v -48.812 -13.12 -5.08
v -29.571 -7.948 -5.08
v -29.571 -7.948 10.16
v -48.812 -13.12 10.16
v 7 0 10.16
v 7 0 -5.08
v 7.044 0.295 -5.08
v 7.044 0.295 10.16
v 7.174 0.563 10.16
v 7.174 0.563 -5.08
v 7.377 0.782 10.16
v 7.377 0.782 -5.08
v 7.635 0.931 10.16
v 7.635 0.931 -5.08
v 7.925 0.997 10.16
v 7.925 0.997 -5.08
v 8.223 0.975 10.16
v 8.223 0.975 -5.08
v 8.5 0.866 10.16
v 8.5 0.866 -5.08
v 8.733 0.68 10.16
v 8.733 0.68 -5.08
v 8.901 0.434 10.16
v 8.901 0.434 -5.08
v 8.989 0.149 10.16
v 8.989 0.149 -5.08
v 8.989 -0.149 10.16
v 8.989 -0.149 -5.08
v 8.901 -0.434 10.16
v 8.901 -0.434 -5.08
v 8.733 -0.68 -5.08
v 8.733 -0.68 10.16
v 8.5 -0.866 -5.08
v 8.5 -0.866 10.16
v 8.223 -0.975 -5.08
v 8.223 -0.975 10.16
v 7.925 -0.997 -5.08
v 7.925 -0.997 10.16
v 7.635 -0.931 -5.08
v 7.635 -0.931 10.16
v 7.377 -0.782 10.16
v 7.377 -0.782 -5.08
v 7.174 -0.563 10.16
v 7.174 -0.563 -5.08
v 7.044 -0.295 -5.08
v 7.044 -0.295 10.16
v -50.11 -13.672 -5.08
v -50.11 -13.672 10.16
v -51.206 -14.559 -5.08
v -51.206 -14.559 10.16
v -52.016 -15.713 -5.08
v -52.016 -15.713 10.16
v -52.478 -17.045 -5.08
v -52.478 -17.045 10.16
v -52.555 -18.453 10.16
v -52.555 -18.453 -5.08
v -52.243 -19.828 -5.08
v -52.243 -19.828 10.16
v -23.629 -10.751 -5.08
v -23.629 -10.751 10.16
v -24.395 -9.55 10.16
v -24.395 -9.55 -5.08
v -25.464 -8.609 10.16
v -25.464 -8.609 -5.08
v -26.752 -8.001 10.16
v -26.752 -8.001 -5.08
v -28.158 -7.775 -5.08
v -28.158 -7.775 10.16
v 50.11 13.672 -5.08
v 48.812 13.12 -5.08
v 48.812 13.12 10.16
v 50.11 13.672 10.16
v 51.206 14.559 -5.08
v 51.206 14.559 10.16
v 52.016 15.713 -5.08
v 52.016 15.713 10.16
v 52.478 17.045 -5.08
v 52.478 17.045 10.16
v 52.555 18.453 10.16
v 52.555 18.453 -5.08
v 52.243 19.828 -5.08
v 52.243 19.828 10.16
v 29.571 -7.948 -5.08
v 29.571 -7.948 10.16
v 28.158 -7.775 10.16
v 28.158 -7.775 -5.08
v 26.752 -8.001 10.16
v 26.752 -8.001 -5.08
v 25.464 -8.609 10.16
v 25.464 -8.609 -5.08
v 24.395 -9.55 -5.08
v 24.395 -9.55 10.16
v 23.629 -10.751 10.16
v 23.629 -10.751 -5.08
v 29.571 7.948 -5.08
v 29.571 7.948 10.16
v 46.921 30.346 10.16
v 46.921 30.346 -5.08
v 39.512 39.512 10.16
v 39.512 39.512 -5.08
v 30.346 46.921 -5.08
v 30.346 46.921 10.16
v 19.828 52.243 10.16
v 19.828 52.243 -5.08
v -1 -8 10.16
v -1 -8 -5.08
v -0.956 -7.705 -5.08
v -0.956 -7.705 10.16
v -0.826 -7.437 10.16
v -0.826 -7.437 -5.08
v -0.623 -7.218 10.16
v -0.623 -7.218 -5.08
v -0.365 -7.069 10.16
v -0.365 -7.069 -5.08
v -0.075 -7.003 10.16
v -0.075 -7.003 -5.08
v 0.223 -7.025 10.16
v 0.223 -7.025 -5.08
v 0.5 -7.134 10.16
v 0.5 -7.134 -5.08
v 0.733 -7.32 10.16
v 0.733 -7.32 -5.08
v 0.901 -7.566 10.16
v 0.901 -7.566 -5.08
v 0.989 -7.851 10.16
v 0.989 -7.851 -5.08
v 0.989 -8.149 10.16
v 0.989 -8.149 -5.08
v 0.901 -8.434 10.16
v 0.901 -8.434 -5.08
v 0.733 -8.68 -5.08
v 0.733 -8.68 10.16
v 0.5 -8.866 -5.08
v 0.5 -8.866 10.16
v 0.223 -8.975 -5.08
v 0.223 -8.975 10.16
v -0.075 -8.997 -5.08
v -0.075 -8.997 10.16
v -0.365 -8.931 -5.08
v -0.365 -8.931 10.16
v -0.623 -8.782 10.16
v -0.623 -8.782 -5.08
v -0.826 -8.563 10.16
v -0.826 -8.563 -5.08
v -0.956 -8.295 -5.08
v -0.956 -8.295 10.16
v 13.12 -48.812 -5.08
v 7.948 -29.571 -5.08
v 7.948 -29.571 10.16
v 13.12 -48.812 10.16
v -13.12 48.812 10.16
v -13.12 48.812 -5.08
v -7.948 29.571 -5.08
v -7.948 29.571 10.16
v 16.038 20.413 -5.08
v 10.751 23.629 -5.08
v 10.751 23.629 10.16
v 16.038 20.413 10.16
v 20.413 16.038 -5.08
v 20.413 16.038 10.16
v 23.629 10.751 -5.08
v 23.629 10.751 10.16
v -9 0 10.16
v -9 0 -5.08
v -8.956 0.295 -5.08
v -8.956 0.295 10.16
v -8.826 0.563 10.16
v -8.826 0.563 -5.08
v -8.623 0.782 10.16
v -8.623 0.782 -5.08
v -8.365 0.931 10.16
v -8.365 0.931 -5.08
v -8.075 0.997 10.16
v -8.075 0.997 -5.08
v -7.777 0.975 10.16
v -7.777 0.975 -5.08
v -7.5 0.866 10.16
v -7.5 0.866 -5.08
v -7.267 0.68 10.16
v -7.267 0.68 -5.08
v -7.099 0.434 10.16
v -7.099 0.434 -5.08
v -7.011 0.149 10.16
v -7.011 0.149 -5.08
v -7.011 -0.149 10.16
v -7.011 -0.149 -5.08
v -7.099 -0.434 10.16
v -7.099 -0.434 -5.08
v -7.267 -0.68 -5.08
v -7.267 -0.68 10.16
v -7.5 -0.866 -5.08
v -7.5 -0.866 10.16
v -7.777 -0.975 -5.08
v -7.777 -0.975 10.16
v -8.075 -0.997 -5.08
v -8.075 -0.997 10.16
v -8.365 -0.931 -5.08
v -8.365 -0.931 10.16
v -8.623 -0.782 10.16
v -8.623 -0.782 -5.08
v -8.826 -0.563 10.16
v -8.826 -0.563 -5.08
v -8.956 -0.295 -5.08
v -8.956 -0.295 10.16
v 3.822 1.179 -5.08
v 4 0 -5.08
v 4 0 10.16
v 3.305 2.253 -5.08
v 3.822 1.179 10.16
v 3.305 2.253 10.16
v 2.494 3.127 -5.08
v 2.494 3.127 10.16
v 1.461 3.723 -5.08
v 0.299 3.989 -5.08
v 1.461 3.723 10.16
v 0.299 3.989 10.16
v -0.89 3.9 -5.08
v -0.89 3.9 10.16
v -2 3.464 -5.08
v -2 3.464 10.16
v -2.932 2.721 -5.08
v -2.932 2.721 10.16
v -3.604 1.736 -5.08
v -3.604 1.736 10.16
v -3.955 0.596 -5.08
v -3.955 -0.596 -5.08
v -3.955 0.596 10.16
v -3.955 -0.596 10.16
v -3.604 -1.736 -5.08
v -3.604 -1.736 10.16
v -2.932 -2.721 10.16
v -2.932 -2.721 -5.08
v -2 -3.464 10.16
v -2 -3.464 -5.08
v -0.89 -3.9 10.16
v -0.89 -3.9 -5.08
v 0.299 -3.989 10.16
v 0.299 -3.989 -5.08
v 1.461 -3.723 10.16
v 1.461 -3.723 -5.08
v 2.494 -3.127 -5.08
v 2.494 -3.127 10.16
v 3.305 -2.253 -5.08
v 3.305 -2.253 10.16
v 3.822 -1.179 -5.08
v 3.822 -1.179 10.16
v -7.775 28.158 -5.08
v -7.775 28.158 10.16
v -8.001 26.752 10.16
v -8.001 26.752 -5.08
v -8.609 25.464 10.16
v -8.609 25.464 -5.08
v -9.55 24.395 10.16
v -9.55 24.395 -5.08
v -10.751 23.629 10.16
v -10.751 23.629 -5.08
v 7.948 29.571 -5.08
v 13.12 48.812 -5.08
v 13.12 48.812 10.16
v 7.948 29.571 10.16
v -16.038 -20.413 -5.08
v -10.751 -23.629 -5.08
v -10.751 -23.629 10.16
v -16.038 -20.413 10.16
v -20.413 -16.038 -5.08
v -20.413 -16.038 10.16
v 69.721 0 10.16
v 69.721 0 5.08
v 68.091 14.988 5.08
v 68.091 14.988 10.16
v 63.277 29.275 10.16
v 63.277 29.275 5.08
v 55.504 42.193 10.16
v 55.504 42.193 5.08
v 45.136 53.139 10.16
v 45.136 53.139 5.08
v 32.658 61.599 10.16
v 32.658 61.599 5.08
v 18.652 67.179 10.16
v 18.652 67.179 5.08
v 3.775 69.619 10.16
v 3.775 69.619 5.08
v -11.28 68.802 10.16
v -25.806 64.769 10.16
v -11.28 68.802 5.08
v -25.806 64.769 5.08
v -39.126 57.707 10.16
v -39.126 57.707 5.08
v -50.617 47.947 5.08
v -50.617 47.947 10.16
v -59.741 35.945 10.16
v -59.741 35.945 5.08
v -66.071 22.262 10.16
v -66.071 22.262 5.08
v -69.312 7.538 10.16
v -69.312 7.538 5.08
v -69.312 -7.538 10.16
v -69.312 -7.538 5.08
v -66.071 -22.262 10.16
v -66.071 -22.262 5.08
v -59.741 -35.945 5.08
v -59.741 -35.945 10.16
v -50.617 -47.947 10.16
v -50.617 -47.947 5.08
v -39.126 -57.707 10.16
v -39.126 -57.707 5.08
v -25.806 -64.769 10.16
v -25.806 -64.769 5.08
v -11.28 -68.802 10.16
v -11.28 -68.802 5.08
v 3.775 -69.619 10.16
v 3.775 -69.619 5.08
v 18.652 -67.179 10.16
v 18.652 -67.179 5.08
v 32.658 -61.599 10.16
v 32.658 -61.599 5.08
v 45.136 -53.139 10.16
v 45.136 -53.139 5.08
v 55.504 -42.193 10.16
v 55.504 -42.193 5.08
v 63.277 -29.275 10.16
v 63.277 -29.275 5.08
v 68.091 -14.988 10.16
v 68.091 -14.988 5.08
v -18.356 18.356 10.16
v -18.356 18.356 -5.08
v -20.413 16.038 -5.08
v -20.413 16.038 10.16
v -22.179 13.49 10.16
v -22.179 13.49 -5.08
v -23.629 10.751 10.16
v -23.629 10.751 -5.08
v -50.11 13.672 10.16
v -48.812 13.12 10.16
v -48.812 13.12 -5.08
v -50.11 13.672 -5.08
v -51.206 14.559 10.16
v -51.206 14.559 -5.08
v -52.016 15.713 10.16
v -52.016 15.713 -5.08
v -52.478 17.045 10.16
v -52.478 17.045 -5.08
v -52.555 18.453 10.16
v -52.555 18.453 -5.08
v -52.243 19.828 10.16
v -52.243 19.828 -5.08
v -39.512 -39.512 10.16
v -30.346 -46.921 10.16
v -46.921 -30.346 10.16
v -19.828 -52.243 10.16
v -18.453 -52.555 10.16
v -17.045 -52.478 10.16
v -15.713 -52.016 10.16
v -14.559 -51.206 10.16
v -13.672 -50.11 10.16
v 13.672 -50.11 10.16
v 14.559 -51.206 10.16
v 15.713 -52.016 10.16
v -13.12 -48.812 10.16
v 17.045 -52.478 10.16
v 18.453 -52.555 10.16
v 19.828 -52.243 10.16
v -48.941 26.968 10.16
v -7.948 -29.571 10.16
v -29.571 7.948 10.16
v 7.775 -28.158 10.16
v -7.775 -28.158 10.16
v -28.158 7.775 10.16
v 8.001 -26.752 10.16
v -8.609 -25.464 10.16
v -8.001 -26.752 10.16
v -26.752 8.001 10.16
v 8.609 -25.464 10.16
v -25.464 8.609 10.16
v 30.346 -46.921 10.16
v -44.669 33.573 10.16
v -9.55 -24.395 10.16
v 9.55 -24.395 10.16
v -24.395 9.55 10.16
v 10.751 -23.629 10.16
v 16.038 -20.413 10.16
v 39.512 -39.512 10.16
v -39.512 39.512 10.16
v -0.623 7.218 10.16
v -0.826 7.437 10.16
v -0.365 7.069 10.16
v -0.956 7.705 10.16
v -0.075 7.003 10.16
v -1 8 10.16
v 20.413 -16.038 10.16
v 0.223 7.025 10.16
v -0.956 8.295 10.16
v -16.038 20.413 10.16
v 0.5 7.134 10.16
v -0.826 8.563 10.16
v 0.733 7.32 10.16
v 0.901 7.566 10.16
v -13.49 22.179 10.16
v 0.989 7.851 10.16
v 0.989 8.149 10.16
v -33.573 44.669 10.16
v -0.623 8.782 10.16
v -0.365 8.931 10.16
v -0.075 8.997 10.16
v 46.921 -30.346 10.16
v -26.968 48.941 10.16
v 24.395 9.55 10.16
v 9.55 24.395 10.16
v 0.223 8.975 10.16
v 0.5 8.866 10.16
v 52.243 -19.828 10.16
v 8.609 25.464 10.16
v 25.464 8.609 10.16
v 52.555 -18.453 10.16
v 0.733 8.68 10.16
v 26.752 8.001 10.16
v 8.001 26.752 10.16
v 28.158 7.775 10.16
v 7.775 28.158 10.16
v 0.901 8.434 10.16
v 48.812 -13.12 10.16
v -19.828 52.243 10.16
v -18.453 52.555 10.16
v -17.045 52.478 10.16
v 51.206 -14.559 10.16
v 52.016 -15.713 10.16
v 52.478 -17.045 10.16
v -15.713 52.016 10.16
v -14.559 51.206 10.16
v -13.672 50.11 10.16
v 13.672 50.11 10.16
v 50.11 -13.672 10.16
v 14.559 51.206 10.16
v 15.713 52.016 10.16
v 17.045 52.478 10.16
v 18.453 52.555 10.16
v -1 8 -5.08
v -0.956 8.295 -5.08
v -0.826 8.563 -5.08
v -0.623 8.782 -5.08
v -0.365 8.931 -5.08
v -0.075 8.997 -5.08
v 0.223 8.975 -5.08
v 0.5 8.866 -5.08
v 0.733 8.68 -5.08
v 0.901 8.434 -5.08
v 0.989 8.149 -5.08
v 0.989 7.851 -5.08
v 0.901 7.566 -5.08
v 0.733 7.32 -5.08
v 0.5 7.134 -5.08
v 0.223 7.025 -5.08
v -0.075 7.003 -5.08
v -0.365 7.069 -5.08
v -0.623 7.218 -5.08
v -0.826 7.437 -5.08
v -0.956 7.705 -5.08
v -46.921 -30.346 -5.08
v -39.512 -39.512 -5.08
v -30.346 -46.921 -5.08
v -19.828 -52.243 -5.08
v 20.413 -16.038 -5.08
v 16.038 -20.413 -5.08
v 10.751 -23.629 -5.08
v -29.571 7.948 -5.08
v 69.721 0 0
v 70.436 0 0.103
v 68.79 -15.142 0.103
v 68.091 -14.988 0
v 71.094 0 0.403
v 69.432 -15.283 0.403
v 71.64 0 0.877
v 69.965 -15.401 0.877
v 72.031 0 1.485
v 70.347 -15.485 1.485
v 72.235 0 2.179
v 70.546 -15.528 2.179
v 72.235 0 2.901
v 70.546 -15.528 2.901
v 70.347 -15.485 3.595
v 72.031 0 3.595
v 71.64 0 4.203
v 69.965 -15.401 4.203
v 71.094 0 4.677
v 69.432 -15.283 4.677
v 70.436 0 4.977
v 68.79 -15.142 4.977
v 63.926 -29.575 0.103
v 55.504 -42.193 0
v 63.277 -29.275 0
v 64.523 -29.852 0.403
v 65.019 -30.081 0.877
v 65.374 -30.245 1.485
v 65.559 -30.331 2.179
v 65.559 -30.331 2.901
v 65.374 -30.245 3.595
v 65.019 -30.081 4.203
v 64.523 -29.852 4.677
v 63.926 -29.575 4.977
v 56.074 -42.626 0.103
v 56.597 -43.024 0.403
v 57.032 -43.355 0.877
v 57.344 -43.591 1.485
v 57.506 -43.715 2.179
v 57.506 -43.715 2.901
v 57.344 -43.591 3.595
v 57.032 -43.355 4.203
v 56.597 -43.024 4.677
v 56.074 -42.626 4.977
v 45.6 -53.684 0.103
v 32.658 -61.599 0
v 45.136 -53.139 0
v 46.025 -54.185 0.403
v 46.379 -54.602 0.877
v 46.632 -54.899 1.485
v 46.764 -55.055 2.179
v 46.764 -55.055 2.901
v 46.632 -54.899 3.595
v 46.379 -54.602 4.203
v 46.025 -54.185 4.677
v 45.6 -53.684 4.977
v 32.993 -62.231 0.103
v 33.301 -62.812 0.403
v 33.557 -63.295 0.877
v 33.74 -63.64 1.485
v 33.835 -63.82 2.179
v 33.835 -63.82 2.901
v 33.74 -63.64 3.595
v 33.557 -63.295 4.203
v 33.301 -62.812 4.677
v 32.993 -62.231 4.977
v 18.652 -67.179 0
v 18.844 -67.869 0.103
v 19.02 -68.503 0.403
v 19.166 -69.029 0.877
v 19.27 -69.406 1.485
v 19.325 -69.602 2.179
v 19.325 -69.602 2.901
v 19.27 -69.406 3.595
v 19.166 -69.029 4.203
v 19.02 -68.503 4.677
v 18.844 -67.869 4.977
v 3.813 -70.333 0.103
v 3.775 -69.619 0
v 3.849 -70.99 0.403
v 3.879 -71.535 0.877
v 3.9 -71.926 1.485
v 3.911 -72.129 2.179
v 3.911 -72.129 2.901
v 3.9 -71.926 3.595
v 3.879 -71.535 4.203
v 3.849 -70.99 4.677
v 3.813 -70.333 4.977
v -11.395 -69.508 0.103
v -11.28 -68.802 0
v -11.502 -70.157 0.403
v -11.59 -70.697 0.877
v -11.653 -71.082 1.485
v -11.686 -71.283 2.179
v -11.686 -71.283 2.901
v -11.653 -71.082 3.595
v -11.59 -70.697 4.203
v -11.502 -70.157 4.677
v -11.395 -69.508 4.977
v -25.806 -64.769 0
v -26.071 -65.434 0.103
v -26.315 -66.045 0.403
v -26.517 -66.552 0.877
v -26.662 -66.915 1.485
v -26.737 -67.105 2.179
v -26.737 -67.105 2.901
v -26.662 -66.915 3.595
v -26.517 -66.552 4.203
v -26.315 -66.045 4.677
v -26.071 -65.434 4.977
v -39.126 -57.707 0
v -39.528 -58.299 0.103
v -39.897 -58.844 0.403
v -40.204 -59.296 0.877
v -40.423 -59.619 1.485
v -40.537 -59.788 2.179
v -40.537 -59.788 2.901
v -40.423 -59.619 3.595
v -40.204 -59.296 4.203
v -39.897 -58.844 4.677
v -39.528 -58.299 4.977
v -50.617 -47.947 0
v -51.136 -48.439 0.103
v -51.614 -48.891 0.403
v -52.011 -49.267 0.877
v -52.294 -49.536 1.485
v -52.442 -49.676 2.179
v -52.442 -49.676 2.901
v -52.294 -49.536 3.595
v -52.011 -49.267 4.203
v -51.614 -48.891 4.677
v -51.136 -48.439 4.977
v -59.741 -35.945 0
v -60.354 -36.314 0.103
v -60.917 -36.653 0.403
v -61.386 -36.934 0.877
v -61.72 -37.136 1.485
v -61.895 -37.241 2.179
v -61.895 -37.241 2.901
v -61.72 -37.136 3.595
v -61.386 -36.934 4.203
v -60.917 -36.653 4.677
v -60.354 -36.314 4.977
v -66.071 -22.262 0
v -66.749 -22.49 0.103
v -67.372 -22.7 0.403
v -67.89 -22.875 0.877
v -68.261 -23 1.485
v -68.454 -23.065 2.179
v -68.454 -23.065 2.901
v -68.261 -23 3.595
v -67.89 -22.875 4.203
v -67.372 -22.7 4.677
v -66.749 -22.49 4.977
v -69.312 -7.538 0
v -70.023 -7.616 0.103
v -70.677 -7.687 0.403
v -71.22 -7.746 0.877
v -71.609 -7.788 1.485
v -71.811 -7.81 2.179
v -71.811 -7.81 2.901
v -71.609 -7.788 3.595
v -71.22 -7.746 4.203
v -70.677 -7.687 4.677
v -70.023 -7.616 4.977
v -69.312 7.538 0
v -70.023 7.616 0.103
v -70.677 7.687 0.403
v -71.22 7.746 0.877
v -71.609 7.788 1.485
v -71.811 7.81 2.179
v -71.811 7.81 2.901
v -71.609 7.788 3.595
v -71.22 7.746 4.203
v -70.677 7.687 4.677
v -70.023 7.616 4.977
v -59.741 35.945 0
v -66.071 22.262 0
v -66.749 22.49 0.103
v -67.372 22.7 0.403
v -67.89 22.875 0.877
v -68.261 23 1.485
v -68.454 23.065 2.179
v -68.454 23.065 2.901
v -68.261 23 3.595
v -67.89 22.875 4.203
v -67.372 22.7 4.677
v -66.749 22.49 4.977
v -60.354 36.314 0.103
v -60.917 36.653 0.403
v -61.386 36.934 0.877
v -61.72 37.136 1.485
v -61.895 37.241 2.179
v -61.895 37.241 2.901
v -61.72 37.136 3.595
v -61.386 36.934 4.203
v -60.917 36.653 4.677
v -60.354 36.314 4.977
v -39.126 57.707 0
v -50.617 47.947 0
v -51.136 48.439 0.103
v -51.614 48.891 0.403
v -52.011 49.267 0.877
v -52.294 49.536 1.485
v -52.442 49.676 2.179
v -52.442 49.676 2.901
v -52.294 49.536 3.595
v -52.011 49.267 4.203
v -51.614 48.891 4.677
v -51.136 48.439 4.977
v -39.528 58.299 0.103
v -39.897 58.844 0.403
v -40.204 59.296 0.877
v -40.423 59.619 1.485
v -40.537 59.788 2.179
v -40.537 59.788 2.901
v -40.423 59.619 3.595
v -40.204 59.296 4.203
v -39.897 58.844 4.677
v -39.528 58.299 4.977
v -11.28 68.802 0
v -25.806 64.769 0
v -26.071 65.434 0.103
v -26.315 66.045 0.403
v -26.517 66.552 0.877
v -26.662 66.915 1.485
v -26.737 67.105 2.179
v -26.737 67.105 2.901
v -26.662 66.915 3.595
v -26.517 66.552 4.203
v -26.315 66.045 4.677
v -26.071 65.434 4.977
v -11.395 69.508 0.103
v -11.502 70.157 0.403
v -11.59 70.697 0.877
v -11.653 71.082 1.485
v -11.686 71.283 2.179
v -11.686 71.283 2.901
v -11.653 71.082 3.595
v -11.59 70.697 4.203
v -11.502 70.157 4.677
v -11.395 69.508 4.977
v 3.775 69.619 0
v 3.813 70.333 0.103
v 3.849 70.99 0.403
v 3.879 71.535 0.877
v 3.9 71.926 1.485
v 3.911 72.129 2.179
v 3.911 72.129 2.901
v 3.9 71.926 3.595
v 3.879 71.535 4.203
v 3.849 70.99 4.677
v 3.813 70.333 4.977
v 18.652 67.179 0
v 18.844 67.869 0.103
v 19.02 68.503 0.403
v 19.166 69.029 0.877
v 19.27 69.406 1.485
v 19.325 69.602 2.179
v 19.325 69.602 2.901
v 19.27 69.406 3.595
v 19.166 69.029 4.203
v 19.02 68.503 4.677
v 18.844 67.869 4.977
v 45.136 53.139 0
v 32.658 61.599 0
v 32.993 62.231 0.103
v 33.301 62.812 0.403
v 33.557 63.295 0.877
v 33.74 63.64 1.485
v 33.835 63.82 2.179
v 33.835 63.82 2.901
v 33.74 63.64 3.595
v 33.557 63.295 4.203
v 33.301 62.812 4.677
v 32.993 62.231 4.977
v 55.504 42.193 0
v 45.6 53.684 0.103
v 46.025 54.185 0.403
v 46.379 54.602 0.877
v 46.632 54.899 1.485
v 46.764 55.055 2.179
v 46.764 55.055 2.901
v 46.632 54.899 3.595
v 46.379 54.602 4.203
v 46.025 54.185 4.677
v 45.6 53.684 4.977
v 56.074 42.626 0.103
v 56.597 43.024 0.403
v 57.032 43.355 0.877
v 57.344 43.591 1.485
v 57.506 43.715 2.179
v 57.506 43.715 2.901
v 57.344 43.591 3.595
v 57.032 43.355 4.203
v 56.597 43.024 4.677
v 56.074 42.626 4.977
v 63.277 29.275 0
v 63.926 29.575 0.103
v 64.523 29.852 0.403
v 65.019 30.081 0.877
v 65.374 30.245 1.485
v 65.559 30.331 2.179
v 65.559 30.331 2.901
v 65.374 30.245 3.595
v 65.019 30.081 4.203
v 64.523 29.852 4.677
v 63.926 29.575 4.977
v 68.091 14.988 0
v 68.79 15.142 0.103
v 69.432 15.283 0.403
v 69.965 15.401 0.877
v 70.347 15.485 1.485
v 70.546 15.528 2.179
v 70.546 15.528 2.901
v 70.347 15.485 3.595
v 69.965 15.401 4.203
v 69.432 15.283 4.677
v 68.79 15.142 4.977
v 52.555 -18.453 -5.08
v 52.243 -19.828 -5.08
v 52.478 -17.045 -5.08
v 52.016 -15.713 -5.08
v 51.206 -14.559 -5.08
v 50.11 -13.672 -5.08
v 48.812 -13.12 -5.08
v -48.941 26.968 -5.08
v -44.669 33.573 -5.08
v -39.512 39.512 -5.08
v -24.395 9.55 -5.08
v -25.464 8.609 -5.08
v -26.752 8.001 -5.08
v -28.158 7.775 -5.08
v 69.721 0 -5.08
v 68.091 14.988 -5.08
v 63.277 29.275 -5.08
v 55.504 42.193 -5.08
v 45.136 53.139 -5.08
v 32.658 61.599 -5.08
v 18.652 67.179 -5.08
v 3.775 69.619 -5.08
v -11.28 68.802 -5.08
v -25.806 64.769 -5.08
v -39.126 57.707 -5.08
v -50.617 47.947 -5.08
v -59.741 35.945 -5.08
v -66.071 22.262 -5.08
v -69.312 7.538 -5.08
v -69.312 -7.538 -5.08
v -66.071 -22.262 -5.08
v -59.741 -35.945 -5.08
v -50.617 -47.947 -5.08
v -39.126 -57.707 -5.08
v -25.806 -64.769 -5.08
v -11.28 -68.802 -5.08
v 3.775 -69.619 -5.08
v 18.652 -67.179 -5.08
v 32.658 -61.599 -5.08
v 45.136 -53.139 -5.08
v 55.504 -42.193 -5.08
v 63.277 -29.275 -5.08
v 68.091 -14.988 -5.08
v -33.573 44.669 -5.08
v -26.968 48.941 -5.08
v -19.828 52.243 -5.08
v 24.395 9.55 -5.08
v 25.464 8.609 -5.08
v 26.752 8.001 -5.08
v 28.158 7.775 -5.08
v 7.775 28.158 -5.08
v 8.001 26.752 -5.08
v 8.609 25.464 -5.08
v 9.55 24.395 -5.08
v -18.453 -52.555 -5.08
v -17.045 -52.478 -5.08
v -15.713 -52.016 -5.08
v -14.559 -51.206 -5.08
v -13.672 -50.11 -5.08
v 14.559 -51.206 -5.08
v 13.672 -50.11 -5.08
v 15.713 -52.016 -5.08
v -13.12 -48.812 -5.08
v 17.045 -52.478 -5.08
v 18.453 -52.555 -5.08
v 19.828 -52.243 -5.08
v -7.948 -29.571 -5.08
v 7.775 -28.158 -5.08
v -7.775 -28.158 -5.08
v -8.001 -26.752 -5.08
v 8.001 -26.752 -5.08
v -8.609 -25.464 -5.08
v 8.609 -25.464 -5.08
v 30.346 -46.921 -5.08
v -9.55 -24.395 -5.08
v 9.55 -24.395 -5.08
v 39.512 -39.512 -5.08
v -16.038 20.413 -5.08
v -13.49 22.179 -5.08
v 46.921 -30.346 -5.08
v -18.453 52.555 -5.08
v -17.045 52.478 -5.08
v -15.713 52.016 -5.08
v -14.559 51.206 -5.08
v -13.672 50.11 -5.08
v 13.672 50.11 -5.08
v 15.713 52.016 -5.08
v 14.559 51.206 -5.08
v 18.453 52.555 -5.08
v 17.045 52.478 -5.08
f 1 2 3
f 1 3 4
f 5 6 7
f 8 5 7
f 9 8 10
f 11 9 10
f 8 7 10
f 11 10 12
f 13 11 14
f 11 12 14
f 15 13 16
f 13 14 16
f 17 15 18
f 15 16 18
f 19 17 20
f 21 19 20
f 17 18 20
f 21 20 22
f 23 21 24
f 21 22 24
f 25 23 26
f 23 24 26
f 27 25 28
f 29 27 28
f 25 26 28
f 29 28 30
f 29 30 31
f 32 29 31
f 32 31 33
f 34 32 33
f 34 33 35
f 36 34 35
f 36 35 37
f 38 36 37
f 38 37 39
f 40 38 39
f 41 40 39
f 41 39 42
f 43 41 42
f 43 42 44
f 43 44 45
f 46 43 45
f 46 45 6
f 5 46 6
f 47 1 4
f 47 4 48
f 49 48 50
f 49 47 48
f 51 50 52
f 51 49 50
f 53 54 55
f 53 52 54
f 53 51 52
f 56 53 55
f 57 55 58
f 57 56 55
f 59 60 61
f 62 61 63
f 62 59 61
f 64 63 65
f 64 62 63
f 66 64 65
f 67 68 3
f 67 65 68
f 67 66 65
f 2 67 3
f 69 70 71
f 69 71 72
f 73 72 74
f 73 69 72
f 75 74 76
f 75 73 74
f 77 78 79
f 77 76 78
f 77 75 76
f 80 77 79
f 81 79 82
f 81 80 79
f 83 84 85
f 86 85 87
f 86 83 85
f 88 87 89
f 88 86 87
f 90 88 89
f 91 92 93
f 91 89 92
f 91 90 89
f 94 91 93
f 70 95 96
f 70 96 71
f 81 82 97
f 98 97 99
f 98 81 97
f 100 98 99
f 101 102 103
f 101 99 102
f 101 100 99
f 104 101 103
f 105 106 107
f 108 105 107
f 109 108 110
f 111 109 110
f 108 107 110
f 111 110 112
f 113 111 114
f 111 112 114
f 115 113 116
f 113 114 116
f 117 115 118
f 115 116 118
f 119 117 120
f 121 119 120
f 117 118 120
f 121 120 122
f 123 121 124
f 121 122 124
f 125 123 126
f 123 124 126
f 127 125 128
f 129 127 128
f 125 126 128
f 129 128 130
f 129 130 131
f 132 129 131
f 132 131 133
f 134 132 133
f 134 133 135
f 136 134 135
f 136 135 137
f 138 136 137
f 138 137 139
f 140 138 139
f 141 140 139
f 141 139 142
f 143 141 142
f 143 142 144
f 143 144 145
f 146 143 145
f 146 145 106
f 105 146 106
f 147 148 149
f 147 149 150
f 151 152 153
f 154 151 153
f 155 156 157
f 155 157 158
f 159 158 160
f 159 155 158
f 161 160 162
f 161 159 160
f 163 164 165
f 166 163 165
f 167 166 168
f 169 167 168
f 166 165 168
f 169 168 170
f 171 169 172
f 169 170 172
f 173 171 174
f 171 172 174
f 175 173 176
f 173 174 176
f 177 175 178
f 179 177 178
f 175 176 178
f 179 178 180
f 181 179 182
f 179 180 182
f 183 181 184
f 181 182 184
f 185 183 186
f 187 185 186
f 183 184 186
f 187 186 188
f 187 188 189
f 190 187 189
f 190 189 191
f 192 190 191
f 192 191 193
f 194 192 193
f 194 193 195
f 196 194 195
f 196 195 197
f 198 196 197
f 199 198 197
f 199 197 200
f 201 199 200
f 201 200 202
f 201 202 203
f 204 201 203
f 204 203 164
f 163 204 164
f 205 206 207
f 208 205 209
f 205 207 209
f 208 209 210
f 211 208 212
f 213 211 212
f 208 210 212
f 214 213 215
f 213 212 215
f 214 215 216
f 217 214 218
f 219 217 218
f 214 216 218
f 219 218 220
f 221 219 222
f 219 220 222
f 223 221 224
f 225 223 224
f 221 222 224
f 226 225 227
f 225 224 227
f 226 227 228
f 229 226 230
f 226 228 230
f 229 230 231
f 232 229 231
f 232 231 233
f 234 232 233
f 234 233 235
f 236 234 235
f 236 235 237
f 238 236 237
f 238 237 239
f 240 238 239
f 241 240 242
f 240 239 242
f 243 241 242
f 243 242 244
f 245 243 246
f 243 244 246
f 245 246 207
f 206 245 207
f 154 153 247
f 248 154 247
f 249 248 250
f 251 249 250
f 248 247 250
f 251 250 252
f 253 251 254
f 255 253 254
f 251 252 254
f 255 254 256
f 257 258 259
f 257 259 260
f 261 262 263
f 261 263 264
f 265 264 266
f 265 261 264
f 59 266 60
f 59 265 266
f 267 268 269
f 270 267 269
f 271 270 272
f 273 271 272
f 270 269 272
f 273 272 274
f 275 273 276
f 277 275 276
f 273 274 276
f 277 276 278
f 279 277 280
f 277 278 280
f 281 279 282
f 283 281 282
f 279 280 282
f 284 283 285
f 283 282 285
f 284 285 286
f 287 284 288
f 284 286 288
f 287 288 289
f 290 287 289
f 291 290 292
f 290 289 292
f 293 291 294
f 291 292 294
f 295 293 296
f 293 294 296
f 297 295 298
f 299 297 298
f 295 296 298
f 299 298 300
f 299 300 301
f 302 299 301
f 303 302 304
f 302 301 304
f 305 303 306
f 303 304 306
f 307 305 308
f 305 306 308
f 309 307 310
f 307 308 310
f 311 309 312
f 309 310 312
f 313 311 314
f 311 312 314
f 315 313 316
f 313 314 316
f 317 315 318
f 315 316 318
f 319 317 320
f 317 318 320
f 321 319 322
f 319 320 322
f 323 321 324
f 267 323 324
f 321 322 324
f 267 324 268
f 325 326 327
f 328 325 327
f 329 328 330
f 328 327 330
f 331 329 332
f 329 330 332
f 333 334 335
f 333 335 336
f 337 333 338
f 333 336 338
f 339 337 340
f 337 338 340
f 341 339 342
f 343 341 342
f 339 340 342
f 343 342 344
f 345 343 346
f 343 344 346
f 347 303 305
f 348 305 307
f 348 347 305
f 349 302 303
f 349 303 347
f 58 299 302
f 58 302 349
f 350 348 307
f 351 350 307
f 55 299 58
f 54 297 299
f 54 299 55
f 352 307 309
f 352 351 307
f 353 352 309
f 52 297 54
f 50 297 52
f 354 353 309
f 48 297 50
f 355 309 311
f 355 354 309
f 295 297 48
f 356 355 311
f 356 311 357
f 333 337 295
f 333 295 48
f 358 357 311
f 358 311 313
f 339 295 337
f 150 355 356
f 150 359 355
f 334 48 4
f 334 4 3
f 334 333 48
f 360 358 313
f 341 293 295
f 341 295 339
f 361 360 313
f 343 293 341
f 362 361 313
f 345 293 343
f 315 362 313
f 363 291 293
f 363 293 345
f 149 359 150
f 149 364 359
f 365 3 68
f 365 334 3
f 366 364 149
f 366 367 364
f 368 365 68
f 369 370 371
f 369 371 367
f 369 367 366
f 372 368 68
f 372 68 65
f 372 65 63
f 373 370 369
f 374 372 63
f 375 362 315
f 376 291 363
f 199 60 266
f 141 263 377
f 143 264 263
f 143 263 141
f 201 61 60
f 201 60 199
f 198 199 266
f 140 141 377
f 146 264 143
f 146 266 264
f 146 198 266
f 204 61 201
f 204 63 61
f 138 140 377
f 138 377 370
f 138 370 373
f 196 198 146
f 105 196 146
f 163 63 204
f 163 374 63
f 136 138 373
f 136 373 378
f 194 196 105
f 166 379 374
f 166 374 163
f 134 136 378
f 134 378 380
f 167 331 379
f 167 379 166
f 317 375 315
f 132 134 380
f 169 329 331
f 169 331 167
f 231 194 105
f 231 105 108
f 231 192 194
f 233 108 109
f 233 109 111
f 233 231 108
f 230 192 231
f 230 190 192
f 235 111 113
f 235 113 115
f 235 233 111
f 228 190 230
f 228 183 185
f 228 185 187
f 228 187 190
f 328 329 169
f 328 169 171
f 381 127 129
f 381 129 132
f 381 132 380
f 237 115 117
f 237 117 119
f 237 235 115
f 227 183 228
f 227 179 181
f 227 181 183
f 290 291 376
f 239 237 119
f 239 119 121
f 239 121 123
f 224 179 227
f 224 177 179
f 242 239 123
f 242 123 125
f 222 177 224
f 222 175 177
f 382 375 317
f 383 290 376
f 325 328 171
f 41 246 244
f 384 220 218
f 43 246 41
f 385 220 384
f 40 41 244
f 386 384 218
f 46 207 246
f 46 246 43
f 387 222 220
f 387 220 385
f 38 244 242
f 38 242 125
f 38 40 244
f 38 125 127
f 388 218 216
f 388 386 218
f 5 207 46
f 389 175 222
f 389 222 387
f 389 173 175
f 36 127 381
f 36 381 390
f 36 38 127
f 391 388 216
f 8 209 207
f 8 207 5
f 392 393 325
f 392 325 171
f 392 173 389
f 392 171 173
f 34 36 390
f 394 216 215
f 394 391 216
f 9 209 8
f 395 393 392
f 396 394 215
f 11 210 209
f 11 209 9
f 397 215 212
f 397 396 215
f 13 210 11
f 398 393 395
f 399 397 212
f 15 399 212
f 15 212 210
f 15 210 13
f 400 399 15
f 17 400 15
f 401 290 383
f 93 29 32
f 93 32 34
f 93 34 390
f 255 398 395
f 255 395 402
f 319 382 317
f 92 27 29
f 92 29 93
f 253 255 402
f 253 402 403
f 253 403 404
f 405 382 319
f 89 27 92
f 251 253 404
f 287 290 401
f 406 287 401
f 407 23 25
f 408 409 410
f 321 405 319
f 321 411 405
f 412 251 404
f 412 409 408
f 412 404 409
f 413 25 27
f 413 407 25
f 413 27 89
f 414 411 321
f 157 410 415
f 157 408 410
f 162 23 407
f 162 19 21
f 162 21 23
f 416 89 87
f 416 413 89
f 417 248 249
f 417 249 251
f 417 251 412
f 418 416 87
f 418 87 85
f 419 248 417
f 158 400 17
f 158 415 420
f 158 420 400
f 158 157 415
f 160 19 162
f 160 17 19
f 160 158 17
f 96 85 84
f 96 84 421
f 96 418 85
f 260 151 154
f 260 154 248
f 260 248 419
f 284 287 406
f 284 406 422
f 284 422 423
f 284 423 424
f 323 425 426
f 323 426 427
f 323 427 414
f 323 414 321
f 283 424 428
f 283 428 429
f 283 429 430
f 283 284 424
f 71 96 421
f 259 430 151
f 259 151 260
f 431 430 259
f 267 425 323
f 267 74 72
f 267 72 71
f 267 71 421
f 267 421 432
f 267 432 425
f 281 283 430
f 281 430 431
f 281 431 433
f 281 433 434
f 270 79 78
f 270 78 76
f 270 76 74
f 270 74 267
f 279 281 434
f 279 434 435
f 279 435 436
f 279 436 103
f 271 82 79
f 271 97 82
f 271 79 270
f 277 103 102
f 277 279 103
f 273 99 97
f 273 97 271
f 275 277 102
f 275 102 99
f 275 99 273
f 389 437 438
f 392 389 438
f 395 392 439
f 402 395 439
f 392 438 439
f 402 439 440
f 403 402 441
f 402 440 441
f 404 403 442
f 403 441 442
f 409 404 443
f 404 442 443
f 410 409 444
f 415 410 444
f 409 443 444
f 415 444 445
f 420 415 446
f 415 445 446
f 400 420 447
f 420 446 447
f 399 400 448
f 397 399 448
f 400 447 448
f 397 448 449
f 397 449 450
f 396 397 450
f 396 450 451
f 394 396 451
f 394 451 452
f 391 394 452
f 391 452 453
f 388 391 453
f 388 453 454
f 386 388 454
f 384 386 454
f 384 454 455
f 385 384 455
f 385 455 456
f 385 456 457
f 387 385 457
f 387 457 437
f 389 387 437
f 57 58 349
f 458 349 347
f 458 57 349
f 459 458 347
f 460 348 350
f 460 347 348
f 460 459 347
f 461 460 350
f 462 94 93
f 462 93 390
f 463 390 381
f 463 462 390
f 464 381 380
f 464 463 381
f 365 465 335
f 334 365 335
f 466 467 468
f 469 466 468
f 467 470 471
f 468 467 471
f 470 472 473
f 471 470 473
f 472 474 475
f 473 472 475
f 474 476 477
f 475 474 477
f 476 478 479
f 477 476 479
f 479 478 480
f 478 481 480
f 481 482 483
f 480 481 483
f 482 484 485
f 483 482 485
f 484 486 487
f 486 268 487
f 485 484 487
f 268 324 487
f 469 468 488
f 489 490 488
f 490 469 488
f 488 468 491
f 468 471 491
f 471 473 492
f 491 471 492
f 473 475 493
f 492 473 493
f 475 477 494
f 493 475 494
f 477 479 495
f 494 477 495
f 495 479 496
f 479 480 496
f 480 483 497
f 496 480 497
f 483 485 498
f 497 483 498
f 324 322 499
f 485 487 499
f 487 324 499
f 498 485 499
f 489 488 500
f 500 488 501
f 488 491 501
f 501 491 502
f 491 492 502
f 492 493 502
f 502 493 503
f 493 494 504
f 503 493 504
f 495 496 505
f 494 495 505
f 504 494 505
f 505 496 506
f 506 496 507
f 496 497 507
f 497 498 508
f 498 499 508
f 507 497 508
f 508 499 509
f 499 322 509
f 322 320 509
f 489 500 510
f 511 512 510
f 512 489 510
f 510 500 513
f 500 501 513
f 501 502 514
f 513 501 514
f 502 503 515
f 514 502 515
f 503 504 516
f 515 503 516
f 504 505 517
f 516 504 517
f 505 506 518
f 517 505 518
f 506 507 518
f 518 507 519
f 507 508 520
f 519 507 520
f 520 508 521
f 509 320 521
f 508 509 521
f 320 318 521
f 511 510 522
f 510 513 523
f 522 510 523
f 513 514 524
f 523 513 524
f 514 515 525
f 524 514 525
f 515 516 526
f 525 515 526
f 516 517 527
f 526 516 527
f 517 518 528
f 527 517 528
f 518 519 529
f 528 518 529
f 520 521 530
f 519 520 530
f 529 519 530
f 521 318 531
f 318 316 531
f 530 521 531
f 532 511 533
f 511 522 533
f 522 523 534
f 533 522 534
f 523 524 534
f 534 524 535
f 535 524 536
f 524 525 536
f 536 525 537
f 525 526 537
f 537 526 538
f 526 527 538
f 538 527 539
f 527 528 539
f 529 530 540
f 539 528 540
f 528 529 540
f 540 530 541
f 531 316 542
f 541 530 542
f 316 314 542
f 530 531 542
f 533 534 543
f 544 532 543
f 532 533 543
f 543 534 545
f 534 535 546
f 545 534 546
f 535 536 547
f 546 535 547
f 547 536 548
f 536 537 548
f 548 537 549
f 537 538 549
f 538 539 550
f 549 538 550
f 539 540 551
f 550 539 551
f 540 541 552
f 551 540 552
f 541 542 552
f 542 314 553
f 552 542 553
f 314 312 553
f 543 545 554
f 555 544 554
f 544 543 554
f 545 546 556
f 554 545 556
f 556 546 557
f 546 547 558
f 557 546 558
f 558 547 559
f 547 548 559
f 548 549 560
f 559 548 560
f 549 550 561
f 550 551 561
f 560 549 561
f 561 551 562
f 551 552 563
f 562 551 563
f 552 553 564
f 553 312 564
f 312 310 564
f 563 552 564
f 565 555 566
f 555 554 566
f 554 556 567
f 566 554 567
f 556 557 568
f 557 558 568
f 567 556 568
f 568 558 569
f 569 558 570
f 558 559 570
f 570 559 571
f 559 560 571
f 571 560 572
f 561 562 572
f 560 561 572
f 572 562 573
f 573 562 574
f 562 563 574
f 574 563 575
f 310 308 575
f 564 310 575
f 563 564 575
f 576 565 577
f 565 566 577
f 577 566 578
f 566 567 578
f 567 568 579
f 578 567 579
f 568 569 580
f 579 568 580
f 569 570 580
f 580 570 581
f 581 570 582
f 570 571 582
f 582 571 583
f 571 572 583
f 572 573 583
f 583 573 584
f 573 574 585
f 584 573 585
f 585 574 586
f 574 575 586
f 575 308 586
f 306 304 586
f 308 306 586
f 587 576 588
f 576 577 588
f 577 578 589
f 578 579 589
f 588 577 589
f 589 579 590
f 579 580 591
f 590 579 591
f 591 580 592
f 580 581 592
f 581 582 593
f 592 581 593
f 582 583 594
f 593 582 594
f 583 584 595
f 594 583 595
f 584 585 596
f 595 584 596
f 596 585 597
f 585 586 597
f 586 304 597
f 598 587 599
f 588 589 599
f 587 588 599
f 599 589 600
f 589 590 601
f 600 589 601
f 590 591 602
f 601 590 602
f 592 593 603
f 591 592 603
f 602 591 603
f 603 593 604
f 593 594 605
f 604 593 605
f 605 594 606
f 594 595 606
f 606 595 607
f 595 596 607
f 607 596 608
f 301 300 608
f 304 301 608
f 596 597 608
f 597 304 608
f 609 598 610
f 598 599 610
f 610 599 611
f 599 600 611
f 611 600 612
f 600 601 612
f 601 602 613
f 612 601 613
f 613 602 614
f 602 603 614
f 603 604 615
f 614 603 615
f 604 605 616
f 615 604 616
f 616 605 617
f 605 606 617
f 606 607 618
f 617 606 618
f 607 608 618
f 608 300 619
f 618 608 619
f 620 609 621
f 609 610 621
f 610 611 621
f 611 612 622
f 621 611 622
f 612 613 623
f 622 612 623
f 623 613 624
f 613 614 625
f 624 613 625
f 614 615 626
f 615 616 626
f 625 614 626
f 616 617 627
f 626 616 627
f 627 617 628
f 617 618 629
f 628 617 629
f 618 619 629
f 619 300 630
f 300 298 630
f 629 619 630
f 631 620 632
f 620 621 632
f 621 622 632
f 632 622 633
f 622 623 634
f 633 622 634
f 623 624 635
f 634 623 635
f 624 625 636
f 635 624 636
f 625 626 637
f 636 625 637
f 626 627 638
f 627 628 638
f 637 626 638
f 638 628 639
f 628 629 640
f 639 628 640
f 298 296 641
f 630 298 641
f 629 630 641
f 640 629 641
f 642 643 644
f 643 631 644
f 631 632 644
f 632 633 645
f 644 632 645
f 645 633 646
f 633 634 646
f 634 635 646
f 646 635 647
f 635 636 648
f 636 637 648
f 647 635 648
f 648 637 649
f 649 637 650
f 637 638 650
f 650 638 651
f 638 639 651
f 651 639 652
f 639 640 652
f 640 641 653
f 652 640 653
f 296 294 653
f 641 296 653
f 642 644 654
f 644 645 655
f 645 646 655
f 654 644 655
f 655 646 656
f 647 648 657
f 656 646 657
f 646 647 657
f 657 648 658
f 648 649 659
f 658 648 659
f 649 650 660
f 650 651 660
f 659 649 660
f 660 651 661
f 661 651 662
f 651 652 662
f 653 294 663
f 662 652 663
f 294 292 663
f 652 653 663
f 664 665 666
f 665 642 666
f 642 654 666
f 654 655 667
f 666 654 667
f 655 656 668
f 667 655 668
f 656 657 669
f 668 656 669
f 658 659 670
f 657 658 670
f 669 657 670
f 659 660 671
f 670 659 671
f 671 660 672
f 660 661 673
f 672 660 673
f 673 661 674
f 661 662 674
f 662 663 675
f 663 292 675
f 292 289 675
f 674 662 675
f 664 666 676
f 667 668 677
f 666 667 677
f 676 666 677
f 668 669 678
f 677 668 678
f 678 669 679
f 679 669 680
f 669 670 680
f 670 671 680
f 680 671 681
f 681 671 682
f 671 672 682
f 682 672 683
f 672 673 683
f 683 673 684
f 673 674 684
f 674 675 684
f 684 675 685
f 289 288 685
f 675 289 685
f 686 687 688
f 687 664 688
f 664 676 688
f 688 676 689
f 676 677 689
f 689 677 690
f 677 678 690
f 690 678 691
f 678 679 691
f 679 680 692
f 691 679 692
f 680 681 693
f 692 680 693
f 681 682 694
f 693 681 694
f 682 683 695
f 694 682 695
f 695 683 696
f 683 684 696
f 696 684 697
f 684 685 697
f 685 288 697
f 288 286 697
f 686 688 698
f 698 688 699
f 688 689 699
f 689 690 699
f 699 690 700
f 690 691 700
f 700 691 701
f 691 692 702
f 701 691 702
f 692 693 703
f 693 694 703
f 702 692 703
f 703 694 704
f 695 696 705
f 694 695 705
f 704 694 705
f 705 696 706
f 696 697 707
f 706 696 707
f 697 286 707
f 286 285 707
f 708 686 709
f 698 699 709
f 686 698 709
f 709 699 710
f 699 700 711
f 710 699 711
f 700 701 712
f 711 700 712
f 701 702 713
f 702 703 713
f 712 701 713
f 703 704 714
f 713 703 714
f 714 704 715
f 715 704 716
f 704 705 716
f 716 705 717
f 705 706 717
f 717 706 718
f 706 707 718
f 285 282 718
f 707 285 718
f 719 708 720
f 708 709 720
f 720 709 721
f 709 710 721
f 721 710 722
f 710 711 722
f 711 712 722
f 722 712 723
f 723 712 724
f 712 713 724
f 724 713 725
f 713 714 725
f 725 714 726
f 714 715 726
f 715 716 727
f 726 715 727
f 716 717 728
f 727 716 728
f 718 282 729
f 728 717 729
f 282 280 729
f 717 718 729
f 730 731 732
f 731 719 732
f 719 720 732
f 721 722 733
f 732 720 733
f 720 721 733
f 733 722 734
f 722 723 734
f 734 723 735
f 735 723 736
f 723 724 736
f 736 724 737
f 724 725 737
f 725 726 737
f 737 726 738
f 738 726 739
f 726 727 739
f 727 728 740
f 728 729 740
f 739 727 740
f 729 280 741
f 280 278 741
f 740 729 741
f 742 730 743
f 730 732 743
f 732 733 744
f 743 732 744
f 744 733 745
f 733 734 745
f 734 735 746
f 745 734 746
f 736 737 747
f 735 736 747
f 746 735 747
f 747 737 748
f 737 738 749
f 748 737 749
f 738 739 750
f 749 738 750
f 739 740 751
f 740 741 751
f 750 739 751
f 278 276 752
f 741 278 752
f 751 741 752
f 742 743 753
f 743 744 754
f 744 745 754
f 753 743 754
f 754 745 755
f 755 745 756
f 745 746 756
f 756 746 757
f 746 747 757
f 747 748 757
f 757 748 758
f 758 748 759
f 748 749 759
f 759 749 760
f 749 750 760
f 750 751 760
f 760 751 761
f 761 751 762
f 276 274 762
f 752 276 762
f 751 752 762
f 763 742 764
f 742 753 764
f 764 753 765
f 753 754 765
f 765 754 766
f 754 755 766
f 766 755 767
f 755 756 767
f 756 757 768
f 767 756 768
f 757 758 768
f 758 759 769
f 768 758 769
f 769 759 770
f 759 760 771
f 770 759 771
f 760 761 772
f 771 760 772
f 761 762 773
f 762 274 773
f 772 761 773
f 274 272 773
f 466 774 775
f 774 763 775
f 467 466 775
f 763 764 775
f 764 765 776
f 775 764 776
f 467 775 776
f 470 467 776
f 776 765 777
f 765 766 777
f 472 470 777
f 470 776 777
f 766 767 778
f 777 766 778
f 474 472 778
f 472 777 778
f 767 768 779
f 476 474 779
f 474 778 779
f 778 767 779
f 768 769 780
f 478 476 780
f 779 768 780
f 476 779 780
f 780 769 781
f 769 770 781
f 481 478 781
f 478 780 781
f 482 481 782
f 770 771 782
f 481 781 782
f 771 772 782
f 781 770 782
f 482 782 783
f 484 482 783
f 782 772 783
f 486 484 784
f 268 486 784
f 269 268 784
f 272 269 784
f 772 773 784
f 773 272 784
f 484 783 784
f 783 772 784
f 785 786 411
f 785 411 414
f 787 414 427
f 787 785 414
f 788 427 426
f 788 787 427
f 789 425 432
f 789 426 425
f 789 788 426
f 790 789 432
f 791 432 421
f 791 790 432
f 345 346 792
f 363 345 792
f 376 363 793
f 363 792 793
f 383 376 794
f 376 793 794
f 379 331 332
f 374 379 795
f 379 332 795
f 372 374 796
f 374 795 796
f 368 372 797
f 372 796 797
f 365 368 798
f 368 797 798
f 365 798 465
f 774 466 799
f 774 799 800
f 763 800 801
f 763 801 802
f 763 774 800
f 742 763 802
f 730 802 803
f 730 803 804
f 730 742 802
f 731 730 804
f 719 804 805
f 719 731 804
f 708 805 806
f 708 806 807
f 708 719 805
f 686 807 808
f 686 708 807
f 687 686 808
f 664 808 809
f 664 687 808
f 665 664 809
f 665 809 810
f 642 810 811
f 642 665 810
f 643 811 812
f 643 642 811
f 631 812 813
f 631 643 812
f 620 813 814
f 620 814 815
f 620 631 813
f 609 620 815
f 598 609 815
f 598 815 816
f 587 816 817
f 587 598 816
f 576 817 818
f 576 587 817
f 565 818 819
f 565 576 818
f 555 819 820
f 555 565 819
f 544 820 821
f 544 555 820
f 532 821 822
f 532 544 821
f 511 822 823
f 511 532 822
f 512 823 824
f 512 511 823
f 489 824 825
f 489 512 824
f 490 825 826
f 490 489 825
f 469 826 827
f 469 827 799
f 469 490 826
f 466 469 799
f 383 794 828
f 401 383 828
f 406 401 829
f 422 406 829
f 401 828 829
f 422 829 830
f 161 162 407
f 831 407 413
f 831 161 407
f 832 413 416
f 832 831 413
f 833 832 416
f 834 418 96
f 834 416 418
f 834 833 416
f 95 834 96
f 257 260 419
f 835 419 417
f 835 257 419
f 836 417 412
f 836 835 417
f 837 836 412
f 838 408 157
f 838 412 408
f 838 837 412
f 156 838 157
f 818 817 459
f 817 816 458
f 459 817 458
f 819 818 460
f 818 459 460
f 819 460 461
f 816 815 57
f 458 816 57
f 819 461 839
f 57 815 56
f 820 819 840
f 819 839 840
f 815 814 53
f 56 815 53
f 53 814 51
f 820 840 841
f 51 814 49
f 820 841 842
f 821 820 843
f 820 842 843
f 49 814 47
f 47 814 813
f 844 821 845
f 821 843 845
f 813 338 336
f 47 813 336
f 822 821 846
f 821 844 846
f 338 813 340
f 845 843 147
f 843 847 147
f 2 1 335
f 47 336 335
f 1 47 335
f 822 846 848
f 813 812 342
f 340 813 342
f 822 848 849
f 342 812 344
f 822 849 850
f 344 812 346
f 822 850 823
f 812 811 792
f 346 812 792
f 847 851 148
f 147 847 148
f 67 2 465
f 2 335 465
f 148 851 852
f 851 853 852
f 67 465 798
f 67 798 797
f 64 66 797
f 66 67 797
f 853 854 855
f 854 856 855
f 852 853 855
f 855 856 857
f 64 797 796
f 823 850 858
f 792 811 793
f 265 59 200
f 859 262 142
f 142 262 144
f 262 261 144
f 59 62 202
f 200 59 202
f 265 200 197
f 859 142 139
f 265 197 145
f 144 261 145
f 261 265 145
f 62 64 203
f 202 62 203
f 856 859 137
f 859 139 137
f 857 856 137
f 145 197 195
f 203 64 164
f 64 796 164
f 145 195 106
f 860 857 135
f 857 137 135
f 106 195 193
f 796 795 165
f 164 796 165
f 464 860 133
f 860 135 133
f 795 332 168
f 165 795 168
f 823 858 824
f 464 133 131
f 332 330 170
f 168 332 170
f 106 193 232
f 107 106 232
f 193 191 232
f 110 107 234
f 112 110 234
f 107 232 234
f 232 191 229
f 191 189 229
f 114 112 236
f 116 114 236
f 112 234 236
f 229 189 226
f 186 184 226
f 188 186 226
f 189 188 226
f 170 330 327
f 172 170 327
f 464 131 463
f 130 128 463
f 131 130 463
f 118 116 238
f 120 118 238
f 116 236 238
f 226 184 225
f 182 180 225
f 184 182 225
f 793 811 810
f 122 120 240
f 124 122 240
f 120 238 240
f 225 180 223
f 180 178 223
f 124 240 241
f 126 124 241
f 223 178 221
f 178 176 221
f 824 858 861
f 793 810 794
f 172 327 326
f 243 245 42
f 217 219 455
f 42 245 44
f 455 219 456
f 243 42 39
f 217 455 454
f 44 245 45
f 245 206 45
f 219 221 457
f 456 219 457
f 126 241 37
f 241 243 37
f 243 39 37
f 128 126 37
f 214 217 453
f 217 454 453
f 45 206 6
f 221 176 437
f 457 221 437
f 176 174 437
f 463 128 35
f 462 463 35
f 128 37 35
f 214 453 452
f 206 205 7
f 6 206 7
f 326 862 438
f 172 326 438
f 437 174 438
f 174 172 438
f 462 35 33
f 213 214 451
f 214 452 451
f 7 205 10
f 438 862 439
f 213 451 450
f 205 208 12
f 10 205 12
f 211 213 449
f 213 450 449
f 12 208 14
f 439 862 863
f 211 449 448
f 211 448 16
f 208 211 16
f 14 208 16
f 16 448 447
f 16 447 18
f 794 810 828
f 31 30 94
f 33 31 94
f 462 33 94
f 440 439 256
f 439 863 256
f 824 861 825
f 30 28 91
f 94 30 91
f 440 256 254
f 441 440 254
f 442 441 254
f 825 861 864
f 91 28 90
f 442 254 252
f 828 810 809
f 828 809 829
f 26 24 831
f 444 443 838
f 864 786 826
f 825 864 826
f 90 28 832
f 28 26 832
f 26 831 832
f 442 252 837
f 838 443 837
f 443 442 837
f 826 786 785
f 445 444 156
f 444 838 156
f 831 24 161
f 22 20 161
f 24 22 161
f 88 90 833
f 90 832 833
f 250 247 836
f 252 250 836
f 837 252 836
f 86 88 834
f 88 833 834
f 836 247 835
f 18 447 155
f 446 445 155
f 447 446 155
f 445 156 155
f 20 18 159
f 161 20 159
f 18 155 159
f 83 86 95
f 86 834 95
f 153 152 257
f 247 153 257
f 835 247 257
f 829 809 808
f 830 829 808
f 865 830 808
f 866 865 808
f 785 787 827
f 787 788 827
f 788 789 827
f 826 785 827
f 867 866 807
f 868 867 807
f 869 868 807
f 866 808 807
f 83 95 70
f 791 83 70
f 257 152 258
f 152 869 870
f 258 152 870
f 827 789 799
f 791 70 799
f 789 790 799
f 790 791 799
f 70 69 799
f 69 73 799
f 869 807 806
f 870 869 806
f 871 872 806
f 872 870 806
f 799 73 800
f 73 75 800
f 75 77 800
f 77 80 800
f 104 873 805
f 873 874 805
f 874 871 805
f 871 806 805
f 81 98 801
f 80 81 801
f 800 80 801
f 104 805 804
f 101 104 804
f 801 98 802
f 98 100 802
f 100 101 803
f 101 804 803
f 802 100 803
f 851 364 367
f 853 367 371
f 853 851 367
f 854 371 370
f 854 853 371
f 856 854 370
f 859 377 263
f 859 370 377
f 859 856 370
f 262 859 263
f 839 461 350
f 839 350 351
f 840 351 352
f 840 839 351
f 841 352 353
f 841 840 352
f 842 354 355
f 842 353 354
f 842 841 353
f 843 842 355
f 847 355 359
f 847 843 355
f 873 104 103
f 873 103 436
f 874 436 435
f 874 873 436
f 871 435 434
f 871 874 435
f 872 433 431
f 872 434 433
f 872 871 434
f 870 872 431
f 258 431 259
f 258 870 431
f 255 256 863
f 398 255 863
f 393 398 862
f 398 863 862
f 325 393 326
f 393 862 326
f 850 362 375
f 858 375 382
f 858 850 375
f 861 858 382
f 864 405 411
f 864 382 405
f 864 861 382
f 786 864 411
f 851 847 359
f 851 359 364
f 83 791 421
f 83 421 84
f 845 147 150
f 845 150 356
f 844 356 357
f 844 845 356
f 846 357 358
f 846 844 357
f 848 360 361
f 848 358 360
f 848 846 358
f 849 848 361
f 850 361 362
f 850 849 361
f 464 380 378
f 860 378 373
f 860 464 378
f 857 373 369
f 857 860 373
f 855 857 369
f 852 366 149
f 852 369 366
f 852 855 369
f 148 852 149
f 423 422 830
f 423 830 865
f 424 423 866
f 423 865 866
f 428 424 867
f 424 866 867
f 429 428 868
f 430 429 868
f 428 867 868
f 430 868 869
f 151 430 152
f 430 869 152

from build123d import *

# Parameters (mm, degrees)
SKETCH1_R           = 63.5
SKETCH1_R_2         = 4
BOSS_EXTRUDE1_DEPTH = 5.08
SKETCH2_R           = 69.720778164
SKETCH2_R_2         = 4
BOSS_EXTRUDE2_DEPTH = 5.08
SKETCH4_R           = 1
CUT_EXTRUDE1_DEPTH  = 100.770894631
CUT_EXTRUDE2_DEPTH  = 104.322300355


with BuildPart() as part:
    # Sketch1 → Boss-Extrude1 (new body)
    with BuildSketch(Plane.XY):
        Circle(SKETCH1_R)
        Circle(SKETCH1_R_2, mode=Mode.SUBTRACT)
    extrude(amount=BOSS_EXTRUDE1_DEPTH)

    # Sketch2 → Boss-Extrude2 (add)
    with BuildSketch(Plane.XY.offset(5.08)):
        Circle(SKETCH2_R)
        Circle(SKETCH2_R_2, mode=Mode.SUBTRACT)
    boss_extrude2 = extrude(amount=BOSS_EXTRUDE2_DEPTH)

    # Mirror1: Boss-Extrude2 across plane
    add(boss_extrude2.mirror(Plane(origin=(0, 0, 2.54), x_dir=(1, 0, 0), z_dir=(0, 0, -1))))

    # Sketch4 → Cut-Extrude1 (cut, through all)
    with BuildSketch(Plane(origin=(0, 0, -5.08), x_dir=(-1, 0, 0), z_dir=(0, 0, -1))):
        with Locations((0, 8)):
            Circle(SKETCH4_R)
        with Locations((8, 0)):
            Circle(SKETCH4_R)
        with Locations((0, -8)):
            Circle(SKETCH4_R)
        with Locations((-8, 0)):
            Circle(SKETCH4_R)
    extrude(amount=-CUT_EXTRUDE1_DEPTH, mode=Mode.SUBTRACT)

    # Sketch5 → Revolve1 (revolve)
    with BuildSketch(Plane(origin=(0, 0, 0), x_dir=(0, 0, -1), z_dir=(1, 0, 0)), mode=Mode.PRIVATE) as revolve1_sk:
        with BuildLine():
            Line((-2.54, 63.5), (0, 63.5))
            Line((0, 63.5), (0, 69.720778164))
            ThreePointArc((0, 69.720778164), (-2.54, 72.260778164), (-5.08, 69.720778164))
            Line((-5.08, 69.720778164), (-5.08, 63.5))
            Line((-5.08, 63.5), (-2.54, 63.5))
        make_face()
    revolve(revolve1_sk.sketch.rotate(Axis((0, 0, 5.08), (0, 0, -1)), 90), axis=Axis((0, 0, 5.08), (0, 0, -1)))

    # Sketch6 → Cut-Extrude2 (cut, through all)
    with BuildSketch(Plane(origin=(0, 0, -5.08), x_dir=(-1, 0, 0), z_dir=(0, 0, -1))):
        with BuildLine():
            Line((-7.948419394, -29.571461023), (-13.119997628, -48.811905768))
            ThreePointArc((-13.119997628, -48.811905768), (-15.712841169, -52.016134189), (-19.828493104, -52.242687832))
            ThreePointArc((-19.828493104, -52.242687832), (-39.512451016, -39.512451016), (-52.242687832, -19.828493104))
            ThreePointArc((-52.242687832, -19.828493104), (-52.016134189, -15.712841169), (-48.811905768, -13.119997628))
            Line((-48.811905768, -13.119997628), (-29.571461023, -7.948419394))
            ThreePointArc((-29.571461023, -7.948419394), (-26.086220535, -8.259490359), (-23.628911169, -10.750533731))
            ThreePointArc((-23.628911169, -10.750533731), (-18.356189944, -18.356189944), (-10.750533731, -23.628911169))
            ThreePointArc((-10.750533731, -23.628911169), (-8.259490359, -26.086220535), (-7.948419394, -29.571461023))
        make_face()
        with BuildLine():
            Line((-29.571461023, 7.948419394), (-48.811905768, 13.119997628))
            ThreePointArc((-48.811905768, 13.119997628), (-52.016134189, 15.712841169), (-52.242687832, 19.828493104))
            ThreePointArc((-52.242687832, 19.828493104), (-39.512451016, 39.512451016), (-19.828493104, 52.242687832))
            ThreePointArc((-19.828493104, 52.242687832), (-15.712841169, 52.016134189), (-13.119997628, 48.811905768))
            Line((-13.119997628, 48.811905768), (-7.948419394, 29.571461023))
            ThreePointArc((-7.948419394, 29.571461023), (-8.259490359, 26.086220535), (-10.750533731, 23.628911169))
            ThreePointArc((-10.750533731, 23.628911169), (-18.356189944, 18.356189944), (-23.628911169, 10.750533731))
            ThreePointArc((-23.628911169, 10.750533731), (-26.086220535, 8.259490359), (-29.571461023, 7.948419394))
        make_face()
        with BuildLine():
            ThreePointArc((19.828493104, 52.242687832), (15.712841169, 52.016134189), (13.119997628, 48.811905768))
            Line((13.119997628, 48.811905768), (7.948419394, 29.571461023))
            ThreePointArc((7.948419394, 29.571461023), (8.259490359, 26.086220535), (10.750533731, 23.628911169))
            ThreePointArc((10.750533731, 23.628911169), (14.790224409, 21.334213847), (18.356189944, 18.356189944))
            Line((18.356189944, 18.356189944), (39.512451016, 39.512451016))
            ThreePointArc((39.512451016, 39.512451016), (30.345537475, 46.921380266), (19.828493104, 52.242687832))
        make_face()
        with BuildLine():
            ThreePointArc((52.242687832, 19.828493104), (46.921380266, 30.345537475), (39.512451016, 39.512451016))
            Line((39.512451016, 39.512451016), (18.356189944, 18.356189944))
            ThreePointArc((18.356189944, 18.356189944), (21.334213847, 14.790224409), (23.628911169, 10.750533731))
            ThreePointArc((23.628911169, 10.750533731), (26.086220535, 8.259490359), (29.571461023, 7.948419394))
            Line((29.571461023, 7.948419394), (48.811905768, 13.119997628))
            ThreePointArc((48.811905768, 13.119997628), (52.016134189, 15.712841169), (52.242687832, 19.828493104))
        make_face()
        with BuildLine():
            Line((29.571461023, -7.948419394), (48.811905768, -13.119997628))
            ThreePointArc((48.811905768, -13.119997628), (52.016134189, -15.712841169), (52.242687832, -19.828493104))
            ThreePointArc((52.242687832, -19.828493104), (39.512451016, -39.512451016), (19.828493104, -52.242687832))
            ThreePointArc((19.828493104, -52.242687832), (15.712841169, -52.016134189), (13.119997628, -48.811905768))
            Line((13.119997628, -48.811905768), (7.948419394, -29.571461023))
            ThreePointArc((7.948419394, -29.571461023), (8.259490359, -26.086220535), (10.750533731, -23.628911169))
            ThreePointArc((10.750533731, -23.628911169), (18.356189944, -18.356189944), (23.628911169, -10.750533731))
            ThreePointArc((23.628911169, -10.750533731), (26.086220535, -8.259490359), (29.571461023, -7.948419394))
        make_face()
    extrude(amount=-CUT_EXTRUDE2_DEPTH, mode=Mode.SUBTRACT)


solid = part.part
